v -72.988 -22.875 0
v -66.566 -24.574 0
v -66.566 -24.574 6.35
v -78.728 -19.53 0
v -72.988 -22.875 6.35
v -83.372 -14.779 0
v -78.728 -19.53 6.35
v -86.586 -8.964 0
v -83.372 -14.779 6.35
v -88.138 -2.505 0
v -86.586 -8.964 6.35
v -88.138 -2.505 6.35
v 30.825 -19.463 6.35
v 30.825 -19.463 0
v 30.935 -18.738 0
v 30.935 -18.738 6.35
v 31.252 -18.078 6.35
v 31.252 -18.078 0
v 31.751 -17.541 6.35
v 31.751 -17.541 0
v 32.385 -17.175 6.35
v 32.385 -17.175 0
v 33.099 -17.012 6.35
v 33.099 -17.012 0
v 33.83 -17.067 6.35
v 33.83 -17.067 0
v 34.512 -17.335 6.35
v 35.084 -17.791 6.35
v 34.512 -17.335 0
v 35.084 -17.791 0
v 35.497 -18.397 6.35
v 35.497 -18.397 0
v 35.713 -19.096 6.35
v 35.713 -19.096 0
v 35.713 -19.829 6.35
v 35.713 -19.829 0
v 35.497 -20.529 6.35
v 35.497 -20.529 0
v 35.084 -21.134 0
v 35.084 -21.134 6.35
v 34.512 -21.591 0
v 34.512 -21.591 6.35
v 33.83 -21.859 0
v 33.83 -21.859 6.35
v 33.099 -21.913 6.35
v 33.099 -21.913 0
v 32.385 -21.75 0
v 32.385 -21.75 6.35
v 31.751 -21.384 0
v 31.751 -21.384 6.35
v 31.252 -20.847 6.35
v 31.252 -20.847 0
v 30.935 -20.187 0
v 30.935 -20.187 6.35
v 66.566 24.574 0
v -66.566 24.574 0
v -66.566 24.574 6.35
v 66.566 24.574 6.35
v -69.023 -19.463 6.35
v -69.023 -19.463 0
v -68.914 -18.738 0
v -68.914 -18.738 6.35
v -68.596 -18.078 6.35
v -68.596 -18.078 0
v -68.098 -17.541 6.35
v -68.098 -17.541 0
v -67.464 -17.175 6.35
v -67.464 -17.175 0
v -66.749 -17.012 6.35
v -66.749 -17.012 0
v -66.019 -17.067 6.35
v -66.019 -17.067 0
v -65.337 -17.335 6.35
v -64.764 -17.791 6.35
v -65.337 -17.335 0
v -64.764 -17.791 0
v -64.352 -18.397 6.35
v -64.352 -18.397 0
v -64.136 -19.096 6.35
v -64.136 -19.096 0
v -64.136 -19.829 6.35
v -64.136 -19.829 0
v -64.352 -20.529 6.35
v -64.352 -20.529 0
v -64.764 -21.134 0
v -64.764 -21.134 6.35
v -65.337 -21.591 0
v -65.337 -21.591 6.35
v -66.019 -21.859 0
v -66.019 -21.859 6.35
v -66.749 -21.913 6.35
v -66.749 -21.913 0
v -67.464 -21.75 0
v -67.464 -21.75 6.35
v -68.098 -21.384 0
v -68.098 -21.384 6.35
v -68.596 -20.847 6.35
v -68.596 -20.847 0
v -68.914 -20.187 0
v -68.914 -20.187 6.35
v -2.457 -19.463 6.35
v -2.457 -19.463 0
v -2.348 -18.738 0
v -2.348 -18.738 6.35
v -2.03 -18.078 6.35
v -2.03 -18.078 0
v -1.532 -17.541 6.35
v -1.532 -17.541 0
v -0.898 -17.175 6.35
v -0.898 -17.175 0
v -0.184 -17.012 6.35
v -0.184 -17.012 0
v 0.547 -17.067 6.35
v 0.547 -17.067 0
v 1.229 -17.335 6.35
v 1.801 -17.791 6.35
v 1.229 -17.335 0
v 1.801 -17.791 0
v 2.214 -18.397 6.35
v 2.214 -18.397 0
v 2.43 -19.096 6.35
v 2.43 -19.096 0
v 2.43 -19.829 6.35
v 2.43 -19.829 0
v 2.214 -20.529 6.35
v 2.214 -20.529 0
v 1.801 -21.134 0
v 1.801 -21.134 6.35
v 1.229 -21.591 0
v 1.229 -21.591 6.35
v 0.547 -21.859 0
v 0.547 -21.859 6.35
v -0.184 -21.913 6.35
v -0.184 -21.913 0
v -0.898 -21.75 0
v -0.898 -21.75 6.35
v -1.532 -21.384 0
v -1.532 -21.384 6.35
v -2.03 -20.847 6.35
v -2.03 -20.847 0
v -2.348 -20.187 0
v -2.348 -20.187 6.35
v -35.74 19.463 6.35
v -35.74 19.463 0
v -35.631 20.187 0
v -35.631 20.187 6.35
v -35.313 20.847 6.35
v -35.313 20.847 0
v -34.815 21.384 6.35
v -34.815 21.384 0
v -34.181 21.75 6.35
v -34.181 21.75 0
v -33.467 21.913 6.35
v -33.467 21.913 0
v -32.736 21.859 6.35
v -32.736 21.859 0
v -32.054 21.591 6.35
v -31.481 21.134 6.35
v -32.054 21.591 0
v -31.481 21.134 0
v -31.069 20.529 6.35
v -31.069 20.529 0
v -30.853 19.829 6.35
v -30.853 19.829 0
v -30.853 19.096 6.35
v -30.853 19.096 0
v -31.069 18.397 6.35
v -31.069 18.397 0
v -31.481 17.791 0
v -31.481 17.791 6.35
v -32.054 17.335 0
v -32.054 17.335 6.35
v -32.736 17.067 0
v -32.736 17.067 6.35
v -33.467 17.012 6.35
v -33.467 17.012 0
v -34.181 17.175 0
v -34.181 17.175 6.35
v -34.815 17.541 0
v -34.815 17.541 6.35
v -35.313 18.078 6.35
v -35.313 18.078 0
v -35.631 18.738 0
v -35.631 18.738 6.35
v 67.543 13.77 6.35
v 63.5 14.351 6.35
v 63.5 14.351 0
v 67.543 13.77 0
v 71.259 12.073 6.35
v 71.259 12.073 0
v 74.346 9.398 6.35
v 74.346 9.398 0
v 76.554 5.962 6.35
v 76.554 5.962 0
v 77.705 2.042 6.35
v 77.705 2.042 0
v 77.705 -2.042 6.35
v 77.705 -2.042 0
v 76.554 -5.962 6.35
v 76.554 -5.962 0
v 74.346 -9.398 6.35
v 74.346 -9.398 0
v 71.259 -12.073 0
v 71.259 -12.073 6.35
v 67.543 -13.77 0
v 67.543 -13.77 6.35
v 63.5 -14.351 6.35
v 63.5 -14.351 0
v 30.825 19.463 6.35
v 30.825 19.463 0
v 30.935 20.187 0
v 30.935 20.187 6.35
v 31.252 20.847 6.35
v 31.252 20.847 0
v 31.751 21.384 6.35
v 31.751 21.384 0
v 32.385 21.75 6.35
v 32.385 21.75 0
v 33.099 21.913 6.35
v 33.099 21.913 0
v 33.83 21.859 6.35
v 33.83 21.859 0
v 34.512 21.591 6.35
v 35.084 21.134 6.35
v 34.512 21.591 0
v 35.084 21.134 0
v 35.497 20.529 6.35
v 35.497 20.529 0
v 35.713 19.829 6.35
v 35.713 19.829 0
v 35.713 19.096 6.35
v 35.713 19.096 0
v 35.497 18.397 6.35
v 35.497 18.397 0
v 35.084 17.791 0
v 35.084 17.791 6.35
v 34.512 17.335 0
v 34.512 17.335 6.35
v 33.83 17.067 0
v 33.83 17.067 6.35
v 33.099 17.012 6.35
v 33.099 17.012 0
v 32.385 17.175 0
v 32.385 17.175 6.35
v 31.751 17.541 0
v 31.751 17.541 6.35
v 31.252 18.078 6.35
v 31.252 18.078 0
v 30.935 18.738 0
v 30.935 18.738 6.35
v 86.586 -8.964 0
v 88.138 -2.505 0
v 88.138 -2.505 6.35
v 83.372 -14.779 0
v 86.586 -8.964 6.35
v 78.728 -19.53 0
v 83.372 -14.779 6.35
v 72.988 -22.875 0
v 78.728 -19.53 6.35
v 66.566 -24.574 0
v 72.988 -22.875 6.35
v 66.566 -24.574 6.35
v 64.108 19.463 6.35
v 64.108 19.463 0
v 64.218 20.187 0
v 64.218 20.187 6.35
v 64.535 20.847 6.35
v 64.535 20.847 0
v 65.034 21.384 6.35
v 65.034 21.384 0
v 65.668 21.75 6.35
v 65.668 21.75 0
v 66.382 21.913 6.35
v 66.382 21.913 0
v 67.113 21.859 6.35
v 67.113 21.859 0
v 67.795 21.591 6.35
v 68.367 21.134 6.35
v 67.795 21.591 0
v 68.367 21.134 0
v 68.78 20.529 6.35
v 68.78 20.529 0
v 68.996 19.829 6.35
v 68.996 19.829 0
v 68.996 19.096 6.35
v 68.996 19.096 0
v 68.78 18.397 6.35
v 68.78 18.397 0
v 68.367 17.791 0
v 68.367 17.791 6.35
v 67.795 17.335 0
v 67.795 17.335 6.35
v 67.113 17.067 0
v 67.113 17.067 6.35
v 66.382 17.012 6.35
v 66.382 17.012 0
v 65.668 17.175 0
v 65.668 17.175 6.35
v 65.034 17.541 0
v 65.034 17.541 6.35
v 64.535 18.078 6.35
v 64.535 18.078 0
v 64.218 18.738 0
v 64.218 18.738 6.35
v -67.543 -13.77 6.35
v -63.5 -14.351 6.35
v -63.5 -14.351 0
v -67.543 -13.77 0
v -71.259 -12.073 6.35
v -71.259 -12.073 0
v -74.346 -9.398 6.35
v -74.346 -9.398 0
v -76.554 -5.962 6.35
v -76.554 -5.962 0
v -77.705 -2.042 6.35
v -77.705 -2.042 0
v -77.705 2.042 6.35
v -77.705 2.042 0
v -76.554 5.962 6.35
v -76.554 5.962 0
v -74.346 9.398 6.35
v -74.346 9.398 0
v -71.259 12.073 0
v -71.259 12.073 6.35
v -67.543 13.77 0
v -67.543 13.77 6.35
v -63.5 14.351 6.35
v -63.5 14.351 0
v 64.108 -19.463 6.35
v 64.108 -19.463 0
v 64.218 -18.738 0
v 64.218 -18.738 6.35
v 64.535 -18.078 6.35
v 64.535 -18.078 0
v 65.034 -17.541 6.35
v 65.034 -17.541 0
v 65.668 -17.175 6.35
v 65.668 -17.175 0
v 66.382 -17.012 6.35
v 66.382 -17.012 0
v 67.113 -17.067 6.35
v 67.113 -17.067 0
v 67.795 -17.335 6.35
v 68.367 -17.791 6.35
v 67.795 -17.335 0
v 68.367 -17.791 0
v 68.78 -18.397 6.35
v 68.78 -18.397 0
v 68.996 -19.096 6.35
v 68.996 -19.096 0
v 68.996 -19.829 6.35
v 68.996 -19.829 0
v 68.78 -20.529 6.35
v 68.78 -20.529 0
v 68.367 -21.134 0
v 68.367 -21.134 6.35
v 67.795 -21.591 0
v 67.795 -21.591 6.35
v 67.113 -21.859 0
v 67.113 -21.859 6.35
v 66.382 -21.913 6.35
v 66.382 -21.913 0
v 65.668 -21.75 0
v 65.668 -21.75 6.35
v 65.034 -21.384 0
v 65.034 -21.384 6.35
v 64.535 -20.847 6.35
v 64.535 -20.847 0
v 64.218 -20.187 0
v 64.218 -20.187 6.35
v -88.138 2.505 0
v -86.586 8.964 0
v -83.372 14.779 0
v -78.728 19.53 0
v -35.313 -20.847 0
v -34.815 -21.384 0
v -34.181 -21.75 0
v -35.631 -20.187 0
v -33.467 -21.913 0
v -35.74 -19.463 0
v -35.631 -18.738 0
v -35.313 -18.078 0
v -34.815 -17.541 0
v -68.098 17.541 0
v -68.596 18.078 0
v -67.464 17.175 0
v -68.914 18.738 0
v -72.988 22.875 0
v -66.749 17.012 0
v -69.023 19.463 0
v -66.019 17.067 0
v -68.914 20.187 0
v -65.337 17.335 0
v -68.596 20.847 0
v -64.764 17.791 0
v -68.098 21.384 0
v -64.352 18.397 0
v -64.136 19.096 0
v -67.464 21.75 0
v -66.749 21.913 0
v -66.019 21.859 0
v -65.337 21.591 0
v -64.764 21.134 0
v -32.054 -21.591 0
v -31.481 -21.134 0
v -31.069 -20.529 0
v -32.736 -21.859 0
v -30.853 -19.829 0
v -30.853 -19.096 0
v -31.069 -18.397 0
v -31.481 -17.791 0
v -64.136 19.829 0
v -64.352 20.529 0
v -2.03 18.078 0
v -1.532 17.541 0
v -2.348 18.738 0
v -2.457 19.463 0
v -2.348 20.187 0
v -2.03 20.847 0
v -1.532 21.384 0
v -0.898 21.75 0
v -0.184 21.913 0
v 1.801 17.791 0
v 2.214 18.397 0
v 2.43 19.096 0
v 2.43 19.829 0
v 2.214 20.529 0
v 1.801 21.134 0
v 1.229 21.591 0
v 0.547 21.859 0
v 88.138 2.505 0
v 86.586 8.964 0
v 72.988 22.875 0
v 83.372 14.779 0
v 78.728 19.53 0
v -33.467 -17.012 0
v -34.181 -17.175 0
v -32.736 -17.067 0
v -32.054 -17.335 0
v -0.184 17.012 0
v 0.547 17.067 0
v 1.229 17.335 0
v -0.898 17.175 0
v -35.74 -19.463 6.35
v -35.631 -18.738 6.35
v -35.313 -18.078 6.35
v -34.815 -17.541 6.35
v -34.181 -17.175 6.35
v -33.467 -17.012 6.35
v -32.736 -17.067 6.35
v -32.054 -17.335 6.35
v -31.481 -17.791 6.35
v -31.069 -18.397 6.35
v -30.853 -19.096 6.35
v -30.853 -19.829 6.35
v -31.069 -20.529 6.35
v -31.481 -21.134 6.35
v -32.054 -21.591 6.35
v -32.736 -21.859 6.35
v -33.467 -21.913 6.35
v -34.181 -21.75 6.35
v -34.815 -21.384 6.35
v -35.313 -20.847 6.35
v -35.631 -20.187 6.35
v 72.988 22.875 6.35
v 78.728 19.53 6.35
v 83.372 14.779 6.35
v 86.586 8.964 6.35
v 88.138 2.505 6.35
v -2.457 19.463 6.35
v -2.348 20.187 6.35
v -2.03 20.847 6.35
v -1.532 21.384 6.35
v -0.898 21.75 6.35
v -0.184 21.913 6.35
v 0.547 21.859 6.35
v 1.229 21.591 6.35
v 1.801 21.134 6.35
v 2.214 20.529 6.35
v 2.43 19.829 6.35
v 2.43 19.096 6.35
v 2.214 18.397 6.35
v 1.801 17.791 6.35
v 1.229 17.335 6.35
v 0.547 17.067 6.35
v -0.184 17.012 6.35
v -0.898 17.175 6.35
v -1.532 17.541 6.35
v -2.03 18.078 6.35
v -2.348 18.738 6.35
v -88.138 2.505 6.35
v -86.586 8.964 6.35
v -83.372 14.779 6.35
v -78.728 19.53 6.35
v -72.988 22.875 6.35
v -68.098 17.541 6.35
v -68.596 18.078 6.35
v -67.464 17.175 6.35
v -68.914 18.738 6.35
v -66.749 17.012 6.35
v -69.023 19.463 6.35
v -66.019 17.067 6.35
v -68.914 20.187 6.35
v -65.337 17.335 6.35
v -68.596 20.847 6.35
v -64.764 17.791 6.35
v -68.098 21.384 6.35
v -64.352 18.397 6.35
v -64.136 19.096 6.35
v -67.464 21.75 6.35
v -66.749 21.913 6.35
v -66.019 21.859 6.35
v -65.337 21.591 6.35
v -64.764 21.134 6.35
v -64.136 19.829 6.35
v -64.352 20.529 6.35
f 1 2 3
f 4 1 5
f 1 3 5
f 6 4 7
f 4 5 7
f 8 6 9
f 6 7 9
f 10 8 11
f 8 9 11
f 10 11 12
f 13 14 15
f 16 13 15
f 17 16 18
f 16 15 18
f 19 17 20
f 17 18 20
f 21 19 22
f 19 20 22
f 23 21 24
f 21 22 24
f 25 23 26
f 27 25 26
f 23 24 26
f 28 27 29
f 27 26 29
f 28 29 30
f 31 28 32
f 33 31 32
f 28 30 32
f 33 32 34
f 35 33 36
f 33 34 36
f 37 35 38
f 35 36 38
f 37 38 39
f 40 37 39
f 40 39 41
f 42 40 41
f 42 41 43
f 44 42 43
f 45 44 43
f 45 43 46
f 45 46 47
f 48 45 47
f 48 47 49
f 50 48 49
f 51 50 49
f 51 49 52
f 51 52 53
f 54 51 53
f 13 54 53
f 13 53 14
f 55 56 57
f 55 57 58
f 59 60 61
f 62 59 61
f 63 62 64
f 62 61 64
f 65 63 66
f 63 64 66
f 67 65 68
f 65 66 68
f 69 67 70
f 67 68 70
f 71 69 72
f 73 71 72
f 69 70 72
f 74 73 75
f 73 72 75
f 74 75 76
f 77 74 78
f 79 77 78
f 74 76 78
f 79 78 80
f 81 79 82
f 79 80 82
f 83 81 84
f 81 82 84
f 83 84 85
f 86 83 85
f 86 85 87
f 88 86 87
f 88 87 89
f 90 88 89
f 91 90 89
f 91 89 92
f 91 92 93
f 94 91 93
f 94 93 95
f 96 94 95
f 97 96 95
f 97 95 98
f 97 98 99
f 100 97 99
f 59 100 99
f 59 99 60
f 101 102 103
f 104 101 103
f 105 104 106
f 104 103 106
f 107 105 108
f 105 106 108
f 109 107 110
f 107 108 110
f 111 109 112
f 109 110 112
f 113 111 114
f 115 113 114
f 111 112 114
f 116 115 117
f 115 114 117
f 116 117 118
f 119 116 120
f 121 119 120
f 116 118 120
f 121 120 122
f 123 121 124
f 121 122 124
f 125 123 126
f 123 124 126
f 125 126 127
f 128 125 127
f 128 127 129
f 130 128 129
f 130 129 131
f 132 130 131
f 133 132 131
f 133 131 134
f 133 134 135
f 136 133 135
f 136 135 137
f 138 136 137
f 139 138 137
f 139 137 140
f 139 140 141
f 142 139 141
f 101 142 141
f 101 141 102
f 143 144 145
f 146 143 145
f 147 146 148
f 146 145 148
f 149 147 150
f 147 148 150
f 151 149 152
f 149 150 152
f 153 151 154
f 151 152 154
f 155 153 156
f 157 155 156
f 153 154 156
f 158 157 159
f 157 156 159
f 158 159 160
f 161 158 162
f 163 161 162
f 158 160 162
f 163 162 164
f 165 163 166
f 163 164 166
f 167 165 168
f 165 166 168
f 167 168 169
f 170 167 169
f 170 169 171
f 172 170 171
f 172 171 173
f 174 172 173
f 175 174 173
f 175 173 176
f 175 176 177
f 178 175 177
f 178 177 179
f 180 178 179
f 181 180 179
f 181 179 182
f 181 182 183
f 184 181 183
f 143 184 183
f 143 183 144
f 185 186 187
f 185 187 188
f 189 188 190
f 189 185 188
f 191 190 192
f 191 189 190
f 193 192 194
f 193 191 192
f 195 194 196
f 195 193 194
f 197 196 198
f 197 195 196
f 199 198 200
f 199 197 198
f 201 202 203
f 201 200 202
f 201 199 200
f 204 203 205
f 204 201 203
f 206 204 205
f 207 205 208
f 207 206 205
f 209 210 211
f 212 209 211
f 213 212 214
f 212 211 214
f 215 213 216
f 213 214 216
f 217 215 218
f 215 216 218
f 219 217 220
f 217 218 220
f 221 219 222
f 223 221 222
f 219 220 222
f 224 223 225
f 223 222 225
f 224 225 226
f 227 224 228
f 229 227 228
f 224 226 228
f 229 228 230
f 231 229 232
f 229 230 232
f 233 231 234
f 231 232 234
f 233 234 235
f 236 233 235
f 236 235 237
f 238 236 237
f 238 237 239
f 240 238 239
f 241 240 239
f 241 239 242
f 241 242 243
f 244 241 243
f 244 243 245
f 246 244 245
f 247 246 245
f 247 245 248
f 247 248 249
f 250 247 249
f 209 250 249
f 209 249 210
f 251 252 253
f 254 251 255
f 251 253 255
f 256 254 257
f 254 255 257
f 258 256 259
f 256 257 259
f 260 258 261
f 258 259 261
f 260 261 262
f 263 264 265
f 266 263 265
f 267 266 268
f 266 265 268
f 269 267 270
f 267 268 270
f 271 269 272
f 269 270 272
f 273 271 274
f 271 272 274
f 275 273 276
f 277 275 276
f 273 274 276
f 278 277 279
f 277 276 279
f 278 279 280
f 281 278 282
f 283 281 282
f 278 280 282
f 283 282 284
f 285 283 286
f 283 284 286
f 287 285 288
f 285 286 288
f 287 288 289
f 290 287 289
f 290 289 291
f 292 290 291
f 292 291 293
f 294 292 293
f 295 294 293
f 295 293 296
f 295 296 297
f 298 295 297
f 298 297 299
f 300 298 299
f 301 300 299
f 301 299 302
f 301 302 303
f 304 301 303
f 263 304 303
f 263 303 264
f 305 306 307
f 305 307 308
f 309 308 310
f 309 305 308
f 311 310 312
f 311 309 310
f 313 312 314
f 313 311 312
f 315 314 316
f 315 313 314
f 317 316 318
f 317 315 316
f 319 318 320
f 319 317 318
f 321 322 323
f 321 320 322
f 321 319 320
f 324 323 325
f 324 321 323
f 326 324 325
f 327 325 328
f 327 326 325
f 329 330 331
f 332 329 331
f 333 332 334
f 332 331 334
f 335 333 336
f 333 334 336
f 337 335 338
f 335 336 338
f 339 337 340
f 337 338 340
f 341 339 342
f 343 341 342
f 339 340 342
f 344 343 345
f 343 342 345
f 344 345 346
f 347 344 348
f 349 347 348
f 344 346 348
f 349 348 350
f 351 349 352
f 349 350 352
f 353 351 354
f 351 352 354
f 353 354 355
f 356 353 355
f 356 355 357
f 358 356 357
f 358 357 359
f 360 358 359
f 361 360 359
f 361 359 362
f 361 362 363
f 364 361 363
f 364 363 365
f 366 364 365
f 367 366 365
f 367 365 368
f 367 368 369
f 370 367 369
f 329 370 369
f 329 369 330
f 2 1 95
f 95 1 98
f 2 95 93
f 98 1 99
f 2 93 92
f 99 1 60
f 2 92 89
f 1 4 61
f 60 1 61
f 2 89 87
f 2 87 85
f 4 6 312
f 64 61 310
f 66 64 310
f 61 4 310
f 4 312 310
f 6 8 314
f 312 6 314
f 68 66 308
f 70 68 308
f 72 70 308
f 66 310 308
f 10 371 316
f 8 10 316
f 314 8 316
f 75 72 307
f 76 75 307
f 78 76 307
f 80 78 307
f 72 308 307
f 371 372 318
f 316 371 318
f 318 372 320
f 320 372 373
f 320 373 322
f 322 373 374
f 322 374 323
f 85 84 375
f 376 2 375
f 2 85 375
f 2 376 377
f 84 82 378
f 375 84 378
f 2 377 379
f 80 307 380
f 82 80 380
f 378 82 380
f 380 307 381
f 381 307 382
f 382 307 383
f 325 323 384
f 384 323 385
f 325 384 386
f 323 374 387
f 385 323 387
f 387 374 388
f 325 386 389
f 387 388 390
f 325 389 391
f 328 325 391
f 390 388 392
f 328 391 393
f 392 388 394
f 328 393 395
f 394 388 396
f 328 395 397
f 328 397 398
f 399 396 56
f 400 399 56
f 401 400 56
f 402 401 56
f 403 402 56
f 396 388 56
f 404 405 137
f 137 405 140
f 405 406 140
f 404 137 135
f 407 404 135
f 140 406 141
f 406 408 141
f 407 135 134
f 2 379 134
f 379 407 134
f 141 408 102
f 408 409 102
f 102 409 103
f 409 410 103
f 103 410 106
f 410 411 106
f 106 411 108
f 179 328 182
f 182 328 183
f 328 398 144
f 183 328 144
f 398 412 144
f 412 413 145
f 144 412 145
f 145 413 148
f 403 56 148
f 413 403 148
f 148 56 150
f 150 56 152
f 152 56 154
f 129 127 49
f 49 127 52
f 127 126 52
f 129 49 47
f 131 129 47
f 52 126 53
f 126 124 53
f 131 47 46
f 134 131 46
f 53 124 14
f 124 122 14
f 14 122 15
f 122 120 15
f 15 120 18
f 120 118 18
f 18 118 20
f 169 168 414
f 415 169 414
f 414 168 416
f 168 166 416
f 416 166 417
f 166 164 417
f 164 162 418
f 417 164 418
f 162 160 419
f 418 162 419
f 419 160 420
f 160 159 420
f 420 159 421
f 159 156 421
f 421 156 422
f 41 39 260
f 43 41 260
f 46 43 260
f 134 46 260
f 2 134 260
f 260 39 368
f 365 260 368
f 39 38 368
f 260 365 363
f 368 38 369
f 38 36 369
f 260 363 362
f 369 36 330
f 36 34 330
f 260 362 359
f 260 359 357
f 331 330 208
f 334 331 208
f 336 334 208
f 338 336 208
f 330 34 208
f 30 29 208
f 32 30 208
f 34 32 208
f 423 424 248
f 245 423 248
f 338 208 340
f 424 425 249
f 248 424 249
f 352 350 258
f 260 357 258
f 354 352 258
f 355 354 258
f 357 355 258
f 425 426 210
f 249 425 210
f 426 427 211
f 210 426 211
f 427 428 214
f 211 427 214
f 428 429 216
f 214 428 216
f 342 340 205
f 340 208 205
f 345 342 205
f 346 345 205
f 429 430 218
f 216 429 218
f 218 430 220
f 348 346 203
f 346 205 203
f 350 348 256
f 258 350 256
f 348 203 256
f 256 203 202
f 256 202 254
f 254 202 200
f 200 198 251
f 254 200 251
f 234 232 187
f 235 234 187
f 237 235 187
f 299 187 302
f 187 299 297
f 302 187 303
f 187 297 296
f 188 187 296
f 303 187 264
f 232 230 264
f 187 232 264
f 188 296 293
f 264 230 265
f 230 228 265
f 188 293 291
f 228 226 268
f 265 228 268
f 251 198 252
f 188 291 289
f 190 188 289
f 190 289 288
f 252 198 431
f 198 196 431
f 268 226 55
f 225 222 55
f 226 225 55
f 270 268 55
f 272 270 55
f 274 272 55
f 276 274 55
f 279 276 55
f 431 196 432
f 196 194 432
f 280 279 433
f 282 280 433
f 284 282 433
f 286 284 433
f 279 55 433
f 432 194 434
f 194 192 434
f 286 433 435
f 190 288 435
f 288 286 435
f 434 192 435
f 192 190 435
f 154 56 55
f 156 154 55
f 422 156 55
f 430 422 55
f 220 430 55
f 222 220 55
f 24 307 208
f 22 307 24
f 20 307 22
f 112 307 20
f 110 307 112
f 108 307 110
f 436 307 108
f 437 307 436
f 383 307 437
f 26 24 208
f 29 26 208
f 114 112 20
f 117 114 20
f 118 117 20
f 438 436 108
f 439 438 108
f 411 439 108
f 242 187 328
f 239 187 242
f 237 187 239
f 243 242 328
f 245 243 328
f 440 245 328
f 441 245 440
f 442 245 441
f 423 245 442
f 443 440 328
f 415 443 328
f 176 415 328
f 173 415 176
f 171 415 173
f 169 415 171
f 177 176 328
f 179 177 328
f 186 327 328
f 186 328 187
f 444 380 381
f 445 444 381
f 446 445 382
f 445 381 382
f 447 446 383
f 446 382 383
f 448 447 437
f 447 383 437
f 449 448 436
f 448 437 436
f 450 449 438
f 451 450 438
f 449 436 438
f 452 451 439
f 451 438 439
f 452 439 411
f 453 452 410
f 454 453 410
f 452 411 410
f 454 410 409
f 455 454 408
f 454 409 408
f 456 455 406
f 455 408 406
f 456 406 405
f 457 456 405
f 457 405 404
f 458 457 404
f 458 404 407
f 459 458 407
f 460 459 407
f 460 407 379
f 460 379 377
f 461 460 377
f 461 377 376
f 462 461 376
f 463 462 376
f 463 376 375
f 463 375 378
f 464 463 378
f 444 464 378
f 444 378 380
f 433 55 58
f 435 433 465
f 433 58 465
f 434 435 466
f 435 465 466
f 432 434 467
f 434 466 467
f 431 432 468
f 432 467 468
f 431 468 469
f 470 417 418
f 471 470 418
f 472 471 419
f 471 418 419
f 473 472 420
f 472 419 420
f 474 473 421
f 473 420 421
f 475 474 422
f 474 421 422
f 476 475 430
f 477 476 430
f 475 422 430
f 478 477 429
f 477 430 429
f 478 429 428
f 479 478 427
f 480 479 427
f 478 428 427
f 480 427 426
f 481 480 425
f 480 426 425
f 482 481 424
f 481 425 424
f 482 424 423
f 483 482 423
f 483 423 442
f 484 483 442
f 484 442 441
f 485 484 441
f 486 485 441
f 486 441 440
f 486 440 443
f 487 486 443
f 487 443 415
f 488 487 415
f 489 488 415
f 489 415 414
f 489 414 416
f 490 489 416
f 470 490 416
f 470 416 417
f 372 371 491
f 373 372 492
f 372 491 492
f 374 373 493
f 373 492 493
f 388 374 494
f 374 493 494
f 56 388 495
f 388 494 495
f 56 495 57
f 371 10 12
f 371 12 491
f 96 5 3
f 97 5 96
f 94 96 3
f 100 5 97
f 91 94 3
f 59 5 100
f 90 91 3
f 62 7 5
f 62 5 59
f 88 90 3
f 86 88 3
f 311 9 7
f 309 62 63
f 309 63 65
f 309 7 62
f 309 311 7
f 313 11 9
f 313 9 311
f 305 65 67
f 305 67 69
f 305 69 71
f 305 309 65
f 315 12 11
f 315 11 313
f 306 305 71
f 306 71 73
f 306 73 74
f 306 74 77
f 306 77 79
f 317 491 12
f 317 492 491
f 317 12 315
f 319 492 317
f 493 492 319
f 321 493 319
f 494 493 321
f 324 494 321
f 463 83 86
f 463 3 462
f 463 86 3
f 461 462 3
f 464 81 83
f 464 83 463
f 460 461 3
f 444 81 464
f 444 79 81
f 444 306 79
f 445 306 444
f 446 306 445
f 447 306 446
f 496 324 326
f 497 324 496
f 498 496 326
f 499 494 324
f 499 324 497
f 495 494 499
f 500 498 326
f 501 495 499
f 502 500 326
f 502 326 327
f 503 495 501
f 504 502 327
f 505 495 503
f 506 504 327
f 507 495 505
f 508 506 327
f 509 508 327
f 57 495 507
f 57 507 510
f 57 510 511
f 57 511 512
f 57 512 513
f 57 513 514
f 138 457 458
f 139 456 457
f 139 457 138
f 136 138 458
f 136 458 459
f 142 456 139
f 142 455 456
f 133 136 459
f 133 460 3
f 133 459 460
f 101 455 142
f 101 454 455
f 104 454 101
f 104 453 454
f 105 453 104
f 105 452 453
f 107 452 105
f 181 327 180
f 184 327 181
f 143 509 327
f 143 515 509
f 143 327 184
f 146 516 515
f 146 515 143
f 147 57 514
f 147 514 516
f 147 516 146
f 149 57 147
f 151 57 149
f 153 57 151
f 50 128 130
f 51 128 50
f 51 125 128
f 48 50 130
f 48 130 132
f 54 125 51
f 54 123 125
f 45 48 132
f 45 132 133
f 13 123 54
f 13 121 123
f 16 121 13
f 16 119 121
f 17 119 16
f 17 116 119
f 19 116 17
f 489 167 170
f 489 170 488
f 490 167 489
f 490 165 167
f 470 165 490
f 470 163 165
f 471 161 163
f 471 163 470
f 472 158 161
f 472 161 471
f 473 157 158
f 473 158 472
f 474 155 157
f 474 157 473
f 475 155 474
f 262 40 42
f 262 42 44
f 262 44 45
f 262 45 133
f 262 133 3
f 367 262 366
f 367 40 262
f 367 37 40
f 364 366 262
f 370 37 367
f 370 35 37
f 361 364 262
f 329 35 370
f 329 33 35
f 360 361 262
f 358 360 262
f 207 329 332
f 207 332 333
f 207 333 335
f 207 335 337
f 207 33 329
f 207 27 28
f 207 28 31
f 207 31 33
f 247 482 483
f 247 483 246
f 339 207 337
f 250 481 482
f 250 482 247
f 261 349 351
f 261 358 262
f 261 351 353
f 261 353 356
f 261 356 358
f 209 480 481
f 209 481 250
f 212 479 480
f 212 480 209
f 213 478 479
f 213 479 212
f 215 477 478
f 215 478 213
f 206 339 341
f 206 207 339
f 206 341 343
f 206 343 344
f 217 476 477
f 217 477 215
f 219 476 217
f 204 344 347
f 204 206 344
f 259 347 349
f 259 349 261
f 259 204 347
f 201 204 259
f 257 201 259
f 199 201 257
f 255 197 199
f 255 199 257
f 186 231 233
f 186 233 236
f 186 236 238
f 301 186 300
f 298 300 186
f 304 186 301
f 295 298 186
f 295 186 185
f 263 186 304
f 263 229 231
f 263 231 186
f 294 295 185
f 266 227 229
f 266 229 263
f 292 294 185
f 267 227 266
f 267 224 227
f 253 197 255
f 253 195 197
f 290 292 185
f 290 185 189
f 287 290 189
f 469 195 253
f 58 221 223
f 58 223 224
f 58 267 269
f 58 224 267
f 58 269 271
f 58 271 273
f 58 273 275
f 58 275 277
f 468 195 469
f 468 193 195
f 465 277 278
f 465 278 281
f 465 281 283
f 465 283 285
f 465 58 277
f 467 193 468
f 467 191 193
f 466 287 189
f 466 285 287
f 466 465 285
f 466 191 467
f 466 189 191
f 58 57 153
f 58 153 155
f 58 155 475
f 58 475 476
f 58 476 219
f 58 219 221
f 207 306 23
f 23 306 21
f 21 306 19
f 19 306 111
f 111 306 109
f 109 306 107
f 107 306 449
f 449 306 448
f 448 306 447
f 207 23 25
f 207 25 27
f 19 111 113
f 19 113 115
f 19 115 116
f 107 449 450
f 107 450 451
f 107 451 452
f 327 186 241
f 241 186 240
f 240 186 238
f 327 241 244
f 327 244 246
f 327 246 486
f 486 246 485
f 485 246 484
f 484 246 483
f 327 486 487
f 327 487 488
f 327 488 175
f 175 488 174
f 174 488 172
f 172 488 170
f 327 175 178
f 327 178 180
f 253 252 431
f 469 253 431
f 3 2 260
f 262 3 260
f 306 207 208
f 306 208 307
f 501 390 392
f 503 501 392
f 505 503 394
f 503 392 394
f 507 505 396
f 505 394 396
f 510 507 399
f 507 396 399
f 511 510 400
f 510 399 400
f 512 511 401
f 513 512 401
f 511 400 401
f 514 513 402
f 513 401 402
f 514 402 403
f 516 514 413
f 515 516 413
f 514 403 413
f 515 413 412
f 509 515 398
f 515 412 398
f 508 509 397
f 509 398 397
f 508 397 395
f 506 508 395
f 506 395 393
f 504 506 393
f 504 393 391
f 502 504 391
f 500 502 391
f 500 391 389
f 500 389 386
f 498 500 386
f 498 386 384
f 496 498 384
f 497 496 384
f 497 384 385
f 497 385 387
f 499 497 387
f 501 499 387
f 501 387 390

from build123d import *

# Parameters (mm, degrees)
SKETCH1_W                    = 176.276
SKETCH1_H                    = 49.149
BOSS_EXTRUDE1_DEPTH          = 6.35
CUT_EXTRUDE1_DEPTH           = 92.719875677
CUT_EXTRUDE4_DEPTH           = 92.719875677
F_10_0_1935_DIAMETER_HOLE1_D = 4.9149


with BuildPart() as part:
    # Sketch1 → Boss-Extrude1 (new body)
    with BuildSketch(Plane.XY):
        Rectangle(SKETCH1_W, SKETCH1_H)
    extrude(amount=BOSS_EXTRUDE1_DEPTH)

    # Sketch2 → Cut-Extrude1 (cut, through all)
    with BuildSketch(Plane.XY.offset(6.35)):
        with BuildLine():
            Line((63.5, -14.351), (-63.5, -14.351))
            ThreePointArc((-63.5, -14.351), (-77.851, 0), (-63.5, 14.351))
            Line((-63.5, 14.351), (63.5, 14.351))
            ThreePointArc((63.5, 14.351), (77.851, 0), (63.5, -14.351))
        make_face()
    extrude(amount=-CUT_EXTRUDE1_DEPTH, mode=Mode.SUBTRACT)

    # Sketch8 → Cut-Extrude4 (cut, through all)
    with BuildSketch(Plane.XY.offset(6.35)):
        with BuildLine():
            ThreePointArc((-88.138, 2.504831531), (-81.209963357, 17.310760321), (-66.565807357, 24.5745))
            Line((-66.565807357, 24.5745), (-88.138, 24.5745))
            Line((-88.138, 24.5745), (-88.138, 2.504831531))
        make_face()
        with BuildLine():
            ThreePointArc((-66.565807357, -24.5745), (-81.209963357, -17.310760321), (-88.138, -2.504831531))
            Line((-88.138, -2.504831531), (-88.138, -24.5745))
            Line((-88.138, -24.5745), (-66.565807357, -24.5745))
        make_face()
        with BuildLine():
            Line((88.138, 24.5745), (66.565807357, 24.5745))
            ThreePointArc((66.565807357, 24.5745), (81.209963357, 17.310760321), (88.138, 2.504831531))
            Line((88.138, 2.504831531), (88.138, 24.5745))
        make_face()
        with BuildLine():
            Line((88.138, -24.5745), (88.138, -2.504831531))
            ThreePointArc((88.138, -2.504831531), (81.209963357, -17.310760321), (66.565807357, -24.5745))
            Line((66.565807357, -24.5745), (88.138, -24.5745))
        make_face()
    extrude(amount=-CUT_EXTRUDE4_DEPTH, mode=Mode.SUBTRACT)

    # #10 (0.1935) Diameter Hole1 (through all)
    with Locations(Plane.XY.offset(6.35)):
        with Locations((-66.565807357, 19.46275), (-33.282903678, 19.46275), (0, 19.46275), (33.282903678, 19.46275), (66.565807357, 19.46275), (66.565807357, -19.46275), (33.282903678, -19.46275), (0, -19.46275), (-33.282903678, -19.46275), (-66.565807357, -19.46275)):
            Hole(F_10_0_1935_DIAMETER_HOLE1_D / 2)


solid = part.part
